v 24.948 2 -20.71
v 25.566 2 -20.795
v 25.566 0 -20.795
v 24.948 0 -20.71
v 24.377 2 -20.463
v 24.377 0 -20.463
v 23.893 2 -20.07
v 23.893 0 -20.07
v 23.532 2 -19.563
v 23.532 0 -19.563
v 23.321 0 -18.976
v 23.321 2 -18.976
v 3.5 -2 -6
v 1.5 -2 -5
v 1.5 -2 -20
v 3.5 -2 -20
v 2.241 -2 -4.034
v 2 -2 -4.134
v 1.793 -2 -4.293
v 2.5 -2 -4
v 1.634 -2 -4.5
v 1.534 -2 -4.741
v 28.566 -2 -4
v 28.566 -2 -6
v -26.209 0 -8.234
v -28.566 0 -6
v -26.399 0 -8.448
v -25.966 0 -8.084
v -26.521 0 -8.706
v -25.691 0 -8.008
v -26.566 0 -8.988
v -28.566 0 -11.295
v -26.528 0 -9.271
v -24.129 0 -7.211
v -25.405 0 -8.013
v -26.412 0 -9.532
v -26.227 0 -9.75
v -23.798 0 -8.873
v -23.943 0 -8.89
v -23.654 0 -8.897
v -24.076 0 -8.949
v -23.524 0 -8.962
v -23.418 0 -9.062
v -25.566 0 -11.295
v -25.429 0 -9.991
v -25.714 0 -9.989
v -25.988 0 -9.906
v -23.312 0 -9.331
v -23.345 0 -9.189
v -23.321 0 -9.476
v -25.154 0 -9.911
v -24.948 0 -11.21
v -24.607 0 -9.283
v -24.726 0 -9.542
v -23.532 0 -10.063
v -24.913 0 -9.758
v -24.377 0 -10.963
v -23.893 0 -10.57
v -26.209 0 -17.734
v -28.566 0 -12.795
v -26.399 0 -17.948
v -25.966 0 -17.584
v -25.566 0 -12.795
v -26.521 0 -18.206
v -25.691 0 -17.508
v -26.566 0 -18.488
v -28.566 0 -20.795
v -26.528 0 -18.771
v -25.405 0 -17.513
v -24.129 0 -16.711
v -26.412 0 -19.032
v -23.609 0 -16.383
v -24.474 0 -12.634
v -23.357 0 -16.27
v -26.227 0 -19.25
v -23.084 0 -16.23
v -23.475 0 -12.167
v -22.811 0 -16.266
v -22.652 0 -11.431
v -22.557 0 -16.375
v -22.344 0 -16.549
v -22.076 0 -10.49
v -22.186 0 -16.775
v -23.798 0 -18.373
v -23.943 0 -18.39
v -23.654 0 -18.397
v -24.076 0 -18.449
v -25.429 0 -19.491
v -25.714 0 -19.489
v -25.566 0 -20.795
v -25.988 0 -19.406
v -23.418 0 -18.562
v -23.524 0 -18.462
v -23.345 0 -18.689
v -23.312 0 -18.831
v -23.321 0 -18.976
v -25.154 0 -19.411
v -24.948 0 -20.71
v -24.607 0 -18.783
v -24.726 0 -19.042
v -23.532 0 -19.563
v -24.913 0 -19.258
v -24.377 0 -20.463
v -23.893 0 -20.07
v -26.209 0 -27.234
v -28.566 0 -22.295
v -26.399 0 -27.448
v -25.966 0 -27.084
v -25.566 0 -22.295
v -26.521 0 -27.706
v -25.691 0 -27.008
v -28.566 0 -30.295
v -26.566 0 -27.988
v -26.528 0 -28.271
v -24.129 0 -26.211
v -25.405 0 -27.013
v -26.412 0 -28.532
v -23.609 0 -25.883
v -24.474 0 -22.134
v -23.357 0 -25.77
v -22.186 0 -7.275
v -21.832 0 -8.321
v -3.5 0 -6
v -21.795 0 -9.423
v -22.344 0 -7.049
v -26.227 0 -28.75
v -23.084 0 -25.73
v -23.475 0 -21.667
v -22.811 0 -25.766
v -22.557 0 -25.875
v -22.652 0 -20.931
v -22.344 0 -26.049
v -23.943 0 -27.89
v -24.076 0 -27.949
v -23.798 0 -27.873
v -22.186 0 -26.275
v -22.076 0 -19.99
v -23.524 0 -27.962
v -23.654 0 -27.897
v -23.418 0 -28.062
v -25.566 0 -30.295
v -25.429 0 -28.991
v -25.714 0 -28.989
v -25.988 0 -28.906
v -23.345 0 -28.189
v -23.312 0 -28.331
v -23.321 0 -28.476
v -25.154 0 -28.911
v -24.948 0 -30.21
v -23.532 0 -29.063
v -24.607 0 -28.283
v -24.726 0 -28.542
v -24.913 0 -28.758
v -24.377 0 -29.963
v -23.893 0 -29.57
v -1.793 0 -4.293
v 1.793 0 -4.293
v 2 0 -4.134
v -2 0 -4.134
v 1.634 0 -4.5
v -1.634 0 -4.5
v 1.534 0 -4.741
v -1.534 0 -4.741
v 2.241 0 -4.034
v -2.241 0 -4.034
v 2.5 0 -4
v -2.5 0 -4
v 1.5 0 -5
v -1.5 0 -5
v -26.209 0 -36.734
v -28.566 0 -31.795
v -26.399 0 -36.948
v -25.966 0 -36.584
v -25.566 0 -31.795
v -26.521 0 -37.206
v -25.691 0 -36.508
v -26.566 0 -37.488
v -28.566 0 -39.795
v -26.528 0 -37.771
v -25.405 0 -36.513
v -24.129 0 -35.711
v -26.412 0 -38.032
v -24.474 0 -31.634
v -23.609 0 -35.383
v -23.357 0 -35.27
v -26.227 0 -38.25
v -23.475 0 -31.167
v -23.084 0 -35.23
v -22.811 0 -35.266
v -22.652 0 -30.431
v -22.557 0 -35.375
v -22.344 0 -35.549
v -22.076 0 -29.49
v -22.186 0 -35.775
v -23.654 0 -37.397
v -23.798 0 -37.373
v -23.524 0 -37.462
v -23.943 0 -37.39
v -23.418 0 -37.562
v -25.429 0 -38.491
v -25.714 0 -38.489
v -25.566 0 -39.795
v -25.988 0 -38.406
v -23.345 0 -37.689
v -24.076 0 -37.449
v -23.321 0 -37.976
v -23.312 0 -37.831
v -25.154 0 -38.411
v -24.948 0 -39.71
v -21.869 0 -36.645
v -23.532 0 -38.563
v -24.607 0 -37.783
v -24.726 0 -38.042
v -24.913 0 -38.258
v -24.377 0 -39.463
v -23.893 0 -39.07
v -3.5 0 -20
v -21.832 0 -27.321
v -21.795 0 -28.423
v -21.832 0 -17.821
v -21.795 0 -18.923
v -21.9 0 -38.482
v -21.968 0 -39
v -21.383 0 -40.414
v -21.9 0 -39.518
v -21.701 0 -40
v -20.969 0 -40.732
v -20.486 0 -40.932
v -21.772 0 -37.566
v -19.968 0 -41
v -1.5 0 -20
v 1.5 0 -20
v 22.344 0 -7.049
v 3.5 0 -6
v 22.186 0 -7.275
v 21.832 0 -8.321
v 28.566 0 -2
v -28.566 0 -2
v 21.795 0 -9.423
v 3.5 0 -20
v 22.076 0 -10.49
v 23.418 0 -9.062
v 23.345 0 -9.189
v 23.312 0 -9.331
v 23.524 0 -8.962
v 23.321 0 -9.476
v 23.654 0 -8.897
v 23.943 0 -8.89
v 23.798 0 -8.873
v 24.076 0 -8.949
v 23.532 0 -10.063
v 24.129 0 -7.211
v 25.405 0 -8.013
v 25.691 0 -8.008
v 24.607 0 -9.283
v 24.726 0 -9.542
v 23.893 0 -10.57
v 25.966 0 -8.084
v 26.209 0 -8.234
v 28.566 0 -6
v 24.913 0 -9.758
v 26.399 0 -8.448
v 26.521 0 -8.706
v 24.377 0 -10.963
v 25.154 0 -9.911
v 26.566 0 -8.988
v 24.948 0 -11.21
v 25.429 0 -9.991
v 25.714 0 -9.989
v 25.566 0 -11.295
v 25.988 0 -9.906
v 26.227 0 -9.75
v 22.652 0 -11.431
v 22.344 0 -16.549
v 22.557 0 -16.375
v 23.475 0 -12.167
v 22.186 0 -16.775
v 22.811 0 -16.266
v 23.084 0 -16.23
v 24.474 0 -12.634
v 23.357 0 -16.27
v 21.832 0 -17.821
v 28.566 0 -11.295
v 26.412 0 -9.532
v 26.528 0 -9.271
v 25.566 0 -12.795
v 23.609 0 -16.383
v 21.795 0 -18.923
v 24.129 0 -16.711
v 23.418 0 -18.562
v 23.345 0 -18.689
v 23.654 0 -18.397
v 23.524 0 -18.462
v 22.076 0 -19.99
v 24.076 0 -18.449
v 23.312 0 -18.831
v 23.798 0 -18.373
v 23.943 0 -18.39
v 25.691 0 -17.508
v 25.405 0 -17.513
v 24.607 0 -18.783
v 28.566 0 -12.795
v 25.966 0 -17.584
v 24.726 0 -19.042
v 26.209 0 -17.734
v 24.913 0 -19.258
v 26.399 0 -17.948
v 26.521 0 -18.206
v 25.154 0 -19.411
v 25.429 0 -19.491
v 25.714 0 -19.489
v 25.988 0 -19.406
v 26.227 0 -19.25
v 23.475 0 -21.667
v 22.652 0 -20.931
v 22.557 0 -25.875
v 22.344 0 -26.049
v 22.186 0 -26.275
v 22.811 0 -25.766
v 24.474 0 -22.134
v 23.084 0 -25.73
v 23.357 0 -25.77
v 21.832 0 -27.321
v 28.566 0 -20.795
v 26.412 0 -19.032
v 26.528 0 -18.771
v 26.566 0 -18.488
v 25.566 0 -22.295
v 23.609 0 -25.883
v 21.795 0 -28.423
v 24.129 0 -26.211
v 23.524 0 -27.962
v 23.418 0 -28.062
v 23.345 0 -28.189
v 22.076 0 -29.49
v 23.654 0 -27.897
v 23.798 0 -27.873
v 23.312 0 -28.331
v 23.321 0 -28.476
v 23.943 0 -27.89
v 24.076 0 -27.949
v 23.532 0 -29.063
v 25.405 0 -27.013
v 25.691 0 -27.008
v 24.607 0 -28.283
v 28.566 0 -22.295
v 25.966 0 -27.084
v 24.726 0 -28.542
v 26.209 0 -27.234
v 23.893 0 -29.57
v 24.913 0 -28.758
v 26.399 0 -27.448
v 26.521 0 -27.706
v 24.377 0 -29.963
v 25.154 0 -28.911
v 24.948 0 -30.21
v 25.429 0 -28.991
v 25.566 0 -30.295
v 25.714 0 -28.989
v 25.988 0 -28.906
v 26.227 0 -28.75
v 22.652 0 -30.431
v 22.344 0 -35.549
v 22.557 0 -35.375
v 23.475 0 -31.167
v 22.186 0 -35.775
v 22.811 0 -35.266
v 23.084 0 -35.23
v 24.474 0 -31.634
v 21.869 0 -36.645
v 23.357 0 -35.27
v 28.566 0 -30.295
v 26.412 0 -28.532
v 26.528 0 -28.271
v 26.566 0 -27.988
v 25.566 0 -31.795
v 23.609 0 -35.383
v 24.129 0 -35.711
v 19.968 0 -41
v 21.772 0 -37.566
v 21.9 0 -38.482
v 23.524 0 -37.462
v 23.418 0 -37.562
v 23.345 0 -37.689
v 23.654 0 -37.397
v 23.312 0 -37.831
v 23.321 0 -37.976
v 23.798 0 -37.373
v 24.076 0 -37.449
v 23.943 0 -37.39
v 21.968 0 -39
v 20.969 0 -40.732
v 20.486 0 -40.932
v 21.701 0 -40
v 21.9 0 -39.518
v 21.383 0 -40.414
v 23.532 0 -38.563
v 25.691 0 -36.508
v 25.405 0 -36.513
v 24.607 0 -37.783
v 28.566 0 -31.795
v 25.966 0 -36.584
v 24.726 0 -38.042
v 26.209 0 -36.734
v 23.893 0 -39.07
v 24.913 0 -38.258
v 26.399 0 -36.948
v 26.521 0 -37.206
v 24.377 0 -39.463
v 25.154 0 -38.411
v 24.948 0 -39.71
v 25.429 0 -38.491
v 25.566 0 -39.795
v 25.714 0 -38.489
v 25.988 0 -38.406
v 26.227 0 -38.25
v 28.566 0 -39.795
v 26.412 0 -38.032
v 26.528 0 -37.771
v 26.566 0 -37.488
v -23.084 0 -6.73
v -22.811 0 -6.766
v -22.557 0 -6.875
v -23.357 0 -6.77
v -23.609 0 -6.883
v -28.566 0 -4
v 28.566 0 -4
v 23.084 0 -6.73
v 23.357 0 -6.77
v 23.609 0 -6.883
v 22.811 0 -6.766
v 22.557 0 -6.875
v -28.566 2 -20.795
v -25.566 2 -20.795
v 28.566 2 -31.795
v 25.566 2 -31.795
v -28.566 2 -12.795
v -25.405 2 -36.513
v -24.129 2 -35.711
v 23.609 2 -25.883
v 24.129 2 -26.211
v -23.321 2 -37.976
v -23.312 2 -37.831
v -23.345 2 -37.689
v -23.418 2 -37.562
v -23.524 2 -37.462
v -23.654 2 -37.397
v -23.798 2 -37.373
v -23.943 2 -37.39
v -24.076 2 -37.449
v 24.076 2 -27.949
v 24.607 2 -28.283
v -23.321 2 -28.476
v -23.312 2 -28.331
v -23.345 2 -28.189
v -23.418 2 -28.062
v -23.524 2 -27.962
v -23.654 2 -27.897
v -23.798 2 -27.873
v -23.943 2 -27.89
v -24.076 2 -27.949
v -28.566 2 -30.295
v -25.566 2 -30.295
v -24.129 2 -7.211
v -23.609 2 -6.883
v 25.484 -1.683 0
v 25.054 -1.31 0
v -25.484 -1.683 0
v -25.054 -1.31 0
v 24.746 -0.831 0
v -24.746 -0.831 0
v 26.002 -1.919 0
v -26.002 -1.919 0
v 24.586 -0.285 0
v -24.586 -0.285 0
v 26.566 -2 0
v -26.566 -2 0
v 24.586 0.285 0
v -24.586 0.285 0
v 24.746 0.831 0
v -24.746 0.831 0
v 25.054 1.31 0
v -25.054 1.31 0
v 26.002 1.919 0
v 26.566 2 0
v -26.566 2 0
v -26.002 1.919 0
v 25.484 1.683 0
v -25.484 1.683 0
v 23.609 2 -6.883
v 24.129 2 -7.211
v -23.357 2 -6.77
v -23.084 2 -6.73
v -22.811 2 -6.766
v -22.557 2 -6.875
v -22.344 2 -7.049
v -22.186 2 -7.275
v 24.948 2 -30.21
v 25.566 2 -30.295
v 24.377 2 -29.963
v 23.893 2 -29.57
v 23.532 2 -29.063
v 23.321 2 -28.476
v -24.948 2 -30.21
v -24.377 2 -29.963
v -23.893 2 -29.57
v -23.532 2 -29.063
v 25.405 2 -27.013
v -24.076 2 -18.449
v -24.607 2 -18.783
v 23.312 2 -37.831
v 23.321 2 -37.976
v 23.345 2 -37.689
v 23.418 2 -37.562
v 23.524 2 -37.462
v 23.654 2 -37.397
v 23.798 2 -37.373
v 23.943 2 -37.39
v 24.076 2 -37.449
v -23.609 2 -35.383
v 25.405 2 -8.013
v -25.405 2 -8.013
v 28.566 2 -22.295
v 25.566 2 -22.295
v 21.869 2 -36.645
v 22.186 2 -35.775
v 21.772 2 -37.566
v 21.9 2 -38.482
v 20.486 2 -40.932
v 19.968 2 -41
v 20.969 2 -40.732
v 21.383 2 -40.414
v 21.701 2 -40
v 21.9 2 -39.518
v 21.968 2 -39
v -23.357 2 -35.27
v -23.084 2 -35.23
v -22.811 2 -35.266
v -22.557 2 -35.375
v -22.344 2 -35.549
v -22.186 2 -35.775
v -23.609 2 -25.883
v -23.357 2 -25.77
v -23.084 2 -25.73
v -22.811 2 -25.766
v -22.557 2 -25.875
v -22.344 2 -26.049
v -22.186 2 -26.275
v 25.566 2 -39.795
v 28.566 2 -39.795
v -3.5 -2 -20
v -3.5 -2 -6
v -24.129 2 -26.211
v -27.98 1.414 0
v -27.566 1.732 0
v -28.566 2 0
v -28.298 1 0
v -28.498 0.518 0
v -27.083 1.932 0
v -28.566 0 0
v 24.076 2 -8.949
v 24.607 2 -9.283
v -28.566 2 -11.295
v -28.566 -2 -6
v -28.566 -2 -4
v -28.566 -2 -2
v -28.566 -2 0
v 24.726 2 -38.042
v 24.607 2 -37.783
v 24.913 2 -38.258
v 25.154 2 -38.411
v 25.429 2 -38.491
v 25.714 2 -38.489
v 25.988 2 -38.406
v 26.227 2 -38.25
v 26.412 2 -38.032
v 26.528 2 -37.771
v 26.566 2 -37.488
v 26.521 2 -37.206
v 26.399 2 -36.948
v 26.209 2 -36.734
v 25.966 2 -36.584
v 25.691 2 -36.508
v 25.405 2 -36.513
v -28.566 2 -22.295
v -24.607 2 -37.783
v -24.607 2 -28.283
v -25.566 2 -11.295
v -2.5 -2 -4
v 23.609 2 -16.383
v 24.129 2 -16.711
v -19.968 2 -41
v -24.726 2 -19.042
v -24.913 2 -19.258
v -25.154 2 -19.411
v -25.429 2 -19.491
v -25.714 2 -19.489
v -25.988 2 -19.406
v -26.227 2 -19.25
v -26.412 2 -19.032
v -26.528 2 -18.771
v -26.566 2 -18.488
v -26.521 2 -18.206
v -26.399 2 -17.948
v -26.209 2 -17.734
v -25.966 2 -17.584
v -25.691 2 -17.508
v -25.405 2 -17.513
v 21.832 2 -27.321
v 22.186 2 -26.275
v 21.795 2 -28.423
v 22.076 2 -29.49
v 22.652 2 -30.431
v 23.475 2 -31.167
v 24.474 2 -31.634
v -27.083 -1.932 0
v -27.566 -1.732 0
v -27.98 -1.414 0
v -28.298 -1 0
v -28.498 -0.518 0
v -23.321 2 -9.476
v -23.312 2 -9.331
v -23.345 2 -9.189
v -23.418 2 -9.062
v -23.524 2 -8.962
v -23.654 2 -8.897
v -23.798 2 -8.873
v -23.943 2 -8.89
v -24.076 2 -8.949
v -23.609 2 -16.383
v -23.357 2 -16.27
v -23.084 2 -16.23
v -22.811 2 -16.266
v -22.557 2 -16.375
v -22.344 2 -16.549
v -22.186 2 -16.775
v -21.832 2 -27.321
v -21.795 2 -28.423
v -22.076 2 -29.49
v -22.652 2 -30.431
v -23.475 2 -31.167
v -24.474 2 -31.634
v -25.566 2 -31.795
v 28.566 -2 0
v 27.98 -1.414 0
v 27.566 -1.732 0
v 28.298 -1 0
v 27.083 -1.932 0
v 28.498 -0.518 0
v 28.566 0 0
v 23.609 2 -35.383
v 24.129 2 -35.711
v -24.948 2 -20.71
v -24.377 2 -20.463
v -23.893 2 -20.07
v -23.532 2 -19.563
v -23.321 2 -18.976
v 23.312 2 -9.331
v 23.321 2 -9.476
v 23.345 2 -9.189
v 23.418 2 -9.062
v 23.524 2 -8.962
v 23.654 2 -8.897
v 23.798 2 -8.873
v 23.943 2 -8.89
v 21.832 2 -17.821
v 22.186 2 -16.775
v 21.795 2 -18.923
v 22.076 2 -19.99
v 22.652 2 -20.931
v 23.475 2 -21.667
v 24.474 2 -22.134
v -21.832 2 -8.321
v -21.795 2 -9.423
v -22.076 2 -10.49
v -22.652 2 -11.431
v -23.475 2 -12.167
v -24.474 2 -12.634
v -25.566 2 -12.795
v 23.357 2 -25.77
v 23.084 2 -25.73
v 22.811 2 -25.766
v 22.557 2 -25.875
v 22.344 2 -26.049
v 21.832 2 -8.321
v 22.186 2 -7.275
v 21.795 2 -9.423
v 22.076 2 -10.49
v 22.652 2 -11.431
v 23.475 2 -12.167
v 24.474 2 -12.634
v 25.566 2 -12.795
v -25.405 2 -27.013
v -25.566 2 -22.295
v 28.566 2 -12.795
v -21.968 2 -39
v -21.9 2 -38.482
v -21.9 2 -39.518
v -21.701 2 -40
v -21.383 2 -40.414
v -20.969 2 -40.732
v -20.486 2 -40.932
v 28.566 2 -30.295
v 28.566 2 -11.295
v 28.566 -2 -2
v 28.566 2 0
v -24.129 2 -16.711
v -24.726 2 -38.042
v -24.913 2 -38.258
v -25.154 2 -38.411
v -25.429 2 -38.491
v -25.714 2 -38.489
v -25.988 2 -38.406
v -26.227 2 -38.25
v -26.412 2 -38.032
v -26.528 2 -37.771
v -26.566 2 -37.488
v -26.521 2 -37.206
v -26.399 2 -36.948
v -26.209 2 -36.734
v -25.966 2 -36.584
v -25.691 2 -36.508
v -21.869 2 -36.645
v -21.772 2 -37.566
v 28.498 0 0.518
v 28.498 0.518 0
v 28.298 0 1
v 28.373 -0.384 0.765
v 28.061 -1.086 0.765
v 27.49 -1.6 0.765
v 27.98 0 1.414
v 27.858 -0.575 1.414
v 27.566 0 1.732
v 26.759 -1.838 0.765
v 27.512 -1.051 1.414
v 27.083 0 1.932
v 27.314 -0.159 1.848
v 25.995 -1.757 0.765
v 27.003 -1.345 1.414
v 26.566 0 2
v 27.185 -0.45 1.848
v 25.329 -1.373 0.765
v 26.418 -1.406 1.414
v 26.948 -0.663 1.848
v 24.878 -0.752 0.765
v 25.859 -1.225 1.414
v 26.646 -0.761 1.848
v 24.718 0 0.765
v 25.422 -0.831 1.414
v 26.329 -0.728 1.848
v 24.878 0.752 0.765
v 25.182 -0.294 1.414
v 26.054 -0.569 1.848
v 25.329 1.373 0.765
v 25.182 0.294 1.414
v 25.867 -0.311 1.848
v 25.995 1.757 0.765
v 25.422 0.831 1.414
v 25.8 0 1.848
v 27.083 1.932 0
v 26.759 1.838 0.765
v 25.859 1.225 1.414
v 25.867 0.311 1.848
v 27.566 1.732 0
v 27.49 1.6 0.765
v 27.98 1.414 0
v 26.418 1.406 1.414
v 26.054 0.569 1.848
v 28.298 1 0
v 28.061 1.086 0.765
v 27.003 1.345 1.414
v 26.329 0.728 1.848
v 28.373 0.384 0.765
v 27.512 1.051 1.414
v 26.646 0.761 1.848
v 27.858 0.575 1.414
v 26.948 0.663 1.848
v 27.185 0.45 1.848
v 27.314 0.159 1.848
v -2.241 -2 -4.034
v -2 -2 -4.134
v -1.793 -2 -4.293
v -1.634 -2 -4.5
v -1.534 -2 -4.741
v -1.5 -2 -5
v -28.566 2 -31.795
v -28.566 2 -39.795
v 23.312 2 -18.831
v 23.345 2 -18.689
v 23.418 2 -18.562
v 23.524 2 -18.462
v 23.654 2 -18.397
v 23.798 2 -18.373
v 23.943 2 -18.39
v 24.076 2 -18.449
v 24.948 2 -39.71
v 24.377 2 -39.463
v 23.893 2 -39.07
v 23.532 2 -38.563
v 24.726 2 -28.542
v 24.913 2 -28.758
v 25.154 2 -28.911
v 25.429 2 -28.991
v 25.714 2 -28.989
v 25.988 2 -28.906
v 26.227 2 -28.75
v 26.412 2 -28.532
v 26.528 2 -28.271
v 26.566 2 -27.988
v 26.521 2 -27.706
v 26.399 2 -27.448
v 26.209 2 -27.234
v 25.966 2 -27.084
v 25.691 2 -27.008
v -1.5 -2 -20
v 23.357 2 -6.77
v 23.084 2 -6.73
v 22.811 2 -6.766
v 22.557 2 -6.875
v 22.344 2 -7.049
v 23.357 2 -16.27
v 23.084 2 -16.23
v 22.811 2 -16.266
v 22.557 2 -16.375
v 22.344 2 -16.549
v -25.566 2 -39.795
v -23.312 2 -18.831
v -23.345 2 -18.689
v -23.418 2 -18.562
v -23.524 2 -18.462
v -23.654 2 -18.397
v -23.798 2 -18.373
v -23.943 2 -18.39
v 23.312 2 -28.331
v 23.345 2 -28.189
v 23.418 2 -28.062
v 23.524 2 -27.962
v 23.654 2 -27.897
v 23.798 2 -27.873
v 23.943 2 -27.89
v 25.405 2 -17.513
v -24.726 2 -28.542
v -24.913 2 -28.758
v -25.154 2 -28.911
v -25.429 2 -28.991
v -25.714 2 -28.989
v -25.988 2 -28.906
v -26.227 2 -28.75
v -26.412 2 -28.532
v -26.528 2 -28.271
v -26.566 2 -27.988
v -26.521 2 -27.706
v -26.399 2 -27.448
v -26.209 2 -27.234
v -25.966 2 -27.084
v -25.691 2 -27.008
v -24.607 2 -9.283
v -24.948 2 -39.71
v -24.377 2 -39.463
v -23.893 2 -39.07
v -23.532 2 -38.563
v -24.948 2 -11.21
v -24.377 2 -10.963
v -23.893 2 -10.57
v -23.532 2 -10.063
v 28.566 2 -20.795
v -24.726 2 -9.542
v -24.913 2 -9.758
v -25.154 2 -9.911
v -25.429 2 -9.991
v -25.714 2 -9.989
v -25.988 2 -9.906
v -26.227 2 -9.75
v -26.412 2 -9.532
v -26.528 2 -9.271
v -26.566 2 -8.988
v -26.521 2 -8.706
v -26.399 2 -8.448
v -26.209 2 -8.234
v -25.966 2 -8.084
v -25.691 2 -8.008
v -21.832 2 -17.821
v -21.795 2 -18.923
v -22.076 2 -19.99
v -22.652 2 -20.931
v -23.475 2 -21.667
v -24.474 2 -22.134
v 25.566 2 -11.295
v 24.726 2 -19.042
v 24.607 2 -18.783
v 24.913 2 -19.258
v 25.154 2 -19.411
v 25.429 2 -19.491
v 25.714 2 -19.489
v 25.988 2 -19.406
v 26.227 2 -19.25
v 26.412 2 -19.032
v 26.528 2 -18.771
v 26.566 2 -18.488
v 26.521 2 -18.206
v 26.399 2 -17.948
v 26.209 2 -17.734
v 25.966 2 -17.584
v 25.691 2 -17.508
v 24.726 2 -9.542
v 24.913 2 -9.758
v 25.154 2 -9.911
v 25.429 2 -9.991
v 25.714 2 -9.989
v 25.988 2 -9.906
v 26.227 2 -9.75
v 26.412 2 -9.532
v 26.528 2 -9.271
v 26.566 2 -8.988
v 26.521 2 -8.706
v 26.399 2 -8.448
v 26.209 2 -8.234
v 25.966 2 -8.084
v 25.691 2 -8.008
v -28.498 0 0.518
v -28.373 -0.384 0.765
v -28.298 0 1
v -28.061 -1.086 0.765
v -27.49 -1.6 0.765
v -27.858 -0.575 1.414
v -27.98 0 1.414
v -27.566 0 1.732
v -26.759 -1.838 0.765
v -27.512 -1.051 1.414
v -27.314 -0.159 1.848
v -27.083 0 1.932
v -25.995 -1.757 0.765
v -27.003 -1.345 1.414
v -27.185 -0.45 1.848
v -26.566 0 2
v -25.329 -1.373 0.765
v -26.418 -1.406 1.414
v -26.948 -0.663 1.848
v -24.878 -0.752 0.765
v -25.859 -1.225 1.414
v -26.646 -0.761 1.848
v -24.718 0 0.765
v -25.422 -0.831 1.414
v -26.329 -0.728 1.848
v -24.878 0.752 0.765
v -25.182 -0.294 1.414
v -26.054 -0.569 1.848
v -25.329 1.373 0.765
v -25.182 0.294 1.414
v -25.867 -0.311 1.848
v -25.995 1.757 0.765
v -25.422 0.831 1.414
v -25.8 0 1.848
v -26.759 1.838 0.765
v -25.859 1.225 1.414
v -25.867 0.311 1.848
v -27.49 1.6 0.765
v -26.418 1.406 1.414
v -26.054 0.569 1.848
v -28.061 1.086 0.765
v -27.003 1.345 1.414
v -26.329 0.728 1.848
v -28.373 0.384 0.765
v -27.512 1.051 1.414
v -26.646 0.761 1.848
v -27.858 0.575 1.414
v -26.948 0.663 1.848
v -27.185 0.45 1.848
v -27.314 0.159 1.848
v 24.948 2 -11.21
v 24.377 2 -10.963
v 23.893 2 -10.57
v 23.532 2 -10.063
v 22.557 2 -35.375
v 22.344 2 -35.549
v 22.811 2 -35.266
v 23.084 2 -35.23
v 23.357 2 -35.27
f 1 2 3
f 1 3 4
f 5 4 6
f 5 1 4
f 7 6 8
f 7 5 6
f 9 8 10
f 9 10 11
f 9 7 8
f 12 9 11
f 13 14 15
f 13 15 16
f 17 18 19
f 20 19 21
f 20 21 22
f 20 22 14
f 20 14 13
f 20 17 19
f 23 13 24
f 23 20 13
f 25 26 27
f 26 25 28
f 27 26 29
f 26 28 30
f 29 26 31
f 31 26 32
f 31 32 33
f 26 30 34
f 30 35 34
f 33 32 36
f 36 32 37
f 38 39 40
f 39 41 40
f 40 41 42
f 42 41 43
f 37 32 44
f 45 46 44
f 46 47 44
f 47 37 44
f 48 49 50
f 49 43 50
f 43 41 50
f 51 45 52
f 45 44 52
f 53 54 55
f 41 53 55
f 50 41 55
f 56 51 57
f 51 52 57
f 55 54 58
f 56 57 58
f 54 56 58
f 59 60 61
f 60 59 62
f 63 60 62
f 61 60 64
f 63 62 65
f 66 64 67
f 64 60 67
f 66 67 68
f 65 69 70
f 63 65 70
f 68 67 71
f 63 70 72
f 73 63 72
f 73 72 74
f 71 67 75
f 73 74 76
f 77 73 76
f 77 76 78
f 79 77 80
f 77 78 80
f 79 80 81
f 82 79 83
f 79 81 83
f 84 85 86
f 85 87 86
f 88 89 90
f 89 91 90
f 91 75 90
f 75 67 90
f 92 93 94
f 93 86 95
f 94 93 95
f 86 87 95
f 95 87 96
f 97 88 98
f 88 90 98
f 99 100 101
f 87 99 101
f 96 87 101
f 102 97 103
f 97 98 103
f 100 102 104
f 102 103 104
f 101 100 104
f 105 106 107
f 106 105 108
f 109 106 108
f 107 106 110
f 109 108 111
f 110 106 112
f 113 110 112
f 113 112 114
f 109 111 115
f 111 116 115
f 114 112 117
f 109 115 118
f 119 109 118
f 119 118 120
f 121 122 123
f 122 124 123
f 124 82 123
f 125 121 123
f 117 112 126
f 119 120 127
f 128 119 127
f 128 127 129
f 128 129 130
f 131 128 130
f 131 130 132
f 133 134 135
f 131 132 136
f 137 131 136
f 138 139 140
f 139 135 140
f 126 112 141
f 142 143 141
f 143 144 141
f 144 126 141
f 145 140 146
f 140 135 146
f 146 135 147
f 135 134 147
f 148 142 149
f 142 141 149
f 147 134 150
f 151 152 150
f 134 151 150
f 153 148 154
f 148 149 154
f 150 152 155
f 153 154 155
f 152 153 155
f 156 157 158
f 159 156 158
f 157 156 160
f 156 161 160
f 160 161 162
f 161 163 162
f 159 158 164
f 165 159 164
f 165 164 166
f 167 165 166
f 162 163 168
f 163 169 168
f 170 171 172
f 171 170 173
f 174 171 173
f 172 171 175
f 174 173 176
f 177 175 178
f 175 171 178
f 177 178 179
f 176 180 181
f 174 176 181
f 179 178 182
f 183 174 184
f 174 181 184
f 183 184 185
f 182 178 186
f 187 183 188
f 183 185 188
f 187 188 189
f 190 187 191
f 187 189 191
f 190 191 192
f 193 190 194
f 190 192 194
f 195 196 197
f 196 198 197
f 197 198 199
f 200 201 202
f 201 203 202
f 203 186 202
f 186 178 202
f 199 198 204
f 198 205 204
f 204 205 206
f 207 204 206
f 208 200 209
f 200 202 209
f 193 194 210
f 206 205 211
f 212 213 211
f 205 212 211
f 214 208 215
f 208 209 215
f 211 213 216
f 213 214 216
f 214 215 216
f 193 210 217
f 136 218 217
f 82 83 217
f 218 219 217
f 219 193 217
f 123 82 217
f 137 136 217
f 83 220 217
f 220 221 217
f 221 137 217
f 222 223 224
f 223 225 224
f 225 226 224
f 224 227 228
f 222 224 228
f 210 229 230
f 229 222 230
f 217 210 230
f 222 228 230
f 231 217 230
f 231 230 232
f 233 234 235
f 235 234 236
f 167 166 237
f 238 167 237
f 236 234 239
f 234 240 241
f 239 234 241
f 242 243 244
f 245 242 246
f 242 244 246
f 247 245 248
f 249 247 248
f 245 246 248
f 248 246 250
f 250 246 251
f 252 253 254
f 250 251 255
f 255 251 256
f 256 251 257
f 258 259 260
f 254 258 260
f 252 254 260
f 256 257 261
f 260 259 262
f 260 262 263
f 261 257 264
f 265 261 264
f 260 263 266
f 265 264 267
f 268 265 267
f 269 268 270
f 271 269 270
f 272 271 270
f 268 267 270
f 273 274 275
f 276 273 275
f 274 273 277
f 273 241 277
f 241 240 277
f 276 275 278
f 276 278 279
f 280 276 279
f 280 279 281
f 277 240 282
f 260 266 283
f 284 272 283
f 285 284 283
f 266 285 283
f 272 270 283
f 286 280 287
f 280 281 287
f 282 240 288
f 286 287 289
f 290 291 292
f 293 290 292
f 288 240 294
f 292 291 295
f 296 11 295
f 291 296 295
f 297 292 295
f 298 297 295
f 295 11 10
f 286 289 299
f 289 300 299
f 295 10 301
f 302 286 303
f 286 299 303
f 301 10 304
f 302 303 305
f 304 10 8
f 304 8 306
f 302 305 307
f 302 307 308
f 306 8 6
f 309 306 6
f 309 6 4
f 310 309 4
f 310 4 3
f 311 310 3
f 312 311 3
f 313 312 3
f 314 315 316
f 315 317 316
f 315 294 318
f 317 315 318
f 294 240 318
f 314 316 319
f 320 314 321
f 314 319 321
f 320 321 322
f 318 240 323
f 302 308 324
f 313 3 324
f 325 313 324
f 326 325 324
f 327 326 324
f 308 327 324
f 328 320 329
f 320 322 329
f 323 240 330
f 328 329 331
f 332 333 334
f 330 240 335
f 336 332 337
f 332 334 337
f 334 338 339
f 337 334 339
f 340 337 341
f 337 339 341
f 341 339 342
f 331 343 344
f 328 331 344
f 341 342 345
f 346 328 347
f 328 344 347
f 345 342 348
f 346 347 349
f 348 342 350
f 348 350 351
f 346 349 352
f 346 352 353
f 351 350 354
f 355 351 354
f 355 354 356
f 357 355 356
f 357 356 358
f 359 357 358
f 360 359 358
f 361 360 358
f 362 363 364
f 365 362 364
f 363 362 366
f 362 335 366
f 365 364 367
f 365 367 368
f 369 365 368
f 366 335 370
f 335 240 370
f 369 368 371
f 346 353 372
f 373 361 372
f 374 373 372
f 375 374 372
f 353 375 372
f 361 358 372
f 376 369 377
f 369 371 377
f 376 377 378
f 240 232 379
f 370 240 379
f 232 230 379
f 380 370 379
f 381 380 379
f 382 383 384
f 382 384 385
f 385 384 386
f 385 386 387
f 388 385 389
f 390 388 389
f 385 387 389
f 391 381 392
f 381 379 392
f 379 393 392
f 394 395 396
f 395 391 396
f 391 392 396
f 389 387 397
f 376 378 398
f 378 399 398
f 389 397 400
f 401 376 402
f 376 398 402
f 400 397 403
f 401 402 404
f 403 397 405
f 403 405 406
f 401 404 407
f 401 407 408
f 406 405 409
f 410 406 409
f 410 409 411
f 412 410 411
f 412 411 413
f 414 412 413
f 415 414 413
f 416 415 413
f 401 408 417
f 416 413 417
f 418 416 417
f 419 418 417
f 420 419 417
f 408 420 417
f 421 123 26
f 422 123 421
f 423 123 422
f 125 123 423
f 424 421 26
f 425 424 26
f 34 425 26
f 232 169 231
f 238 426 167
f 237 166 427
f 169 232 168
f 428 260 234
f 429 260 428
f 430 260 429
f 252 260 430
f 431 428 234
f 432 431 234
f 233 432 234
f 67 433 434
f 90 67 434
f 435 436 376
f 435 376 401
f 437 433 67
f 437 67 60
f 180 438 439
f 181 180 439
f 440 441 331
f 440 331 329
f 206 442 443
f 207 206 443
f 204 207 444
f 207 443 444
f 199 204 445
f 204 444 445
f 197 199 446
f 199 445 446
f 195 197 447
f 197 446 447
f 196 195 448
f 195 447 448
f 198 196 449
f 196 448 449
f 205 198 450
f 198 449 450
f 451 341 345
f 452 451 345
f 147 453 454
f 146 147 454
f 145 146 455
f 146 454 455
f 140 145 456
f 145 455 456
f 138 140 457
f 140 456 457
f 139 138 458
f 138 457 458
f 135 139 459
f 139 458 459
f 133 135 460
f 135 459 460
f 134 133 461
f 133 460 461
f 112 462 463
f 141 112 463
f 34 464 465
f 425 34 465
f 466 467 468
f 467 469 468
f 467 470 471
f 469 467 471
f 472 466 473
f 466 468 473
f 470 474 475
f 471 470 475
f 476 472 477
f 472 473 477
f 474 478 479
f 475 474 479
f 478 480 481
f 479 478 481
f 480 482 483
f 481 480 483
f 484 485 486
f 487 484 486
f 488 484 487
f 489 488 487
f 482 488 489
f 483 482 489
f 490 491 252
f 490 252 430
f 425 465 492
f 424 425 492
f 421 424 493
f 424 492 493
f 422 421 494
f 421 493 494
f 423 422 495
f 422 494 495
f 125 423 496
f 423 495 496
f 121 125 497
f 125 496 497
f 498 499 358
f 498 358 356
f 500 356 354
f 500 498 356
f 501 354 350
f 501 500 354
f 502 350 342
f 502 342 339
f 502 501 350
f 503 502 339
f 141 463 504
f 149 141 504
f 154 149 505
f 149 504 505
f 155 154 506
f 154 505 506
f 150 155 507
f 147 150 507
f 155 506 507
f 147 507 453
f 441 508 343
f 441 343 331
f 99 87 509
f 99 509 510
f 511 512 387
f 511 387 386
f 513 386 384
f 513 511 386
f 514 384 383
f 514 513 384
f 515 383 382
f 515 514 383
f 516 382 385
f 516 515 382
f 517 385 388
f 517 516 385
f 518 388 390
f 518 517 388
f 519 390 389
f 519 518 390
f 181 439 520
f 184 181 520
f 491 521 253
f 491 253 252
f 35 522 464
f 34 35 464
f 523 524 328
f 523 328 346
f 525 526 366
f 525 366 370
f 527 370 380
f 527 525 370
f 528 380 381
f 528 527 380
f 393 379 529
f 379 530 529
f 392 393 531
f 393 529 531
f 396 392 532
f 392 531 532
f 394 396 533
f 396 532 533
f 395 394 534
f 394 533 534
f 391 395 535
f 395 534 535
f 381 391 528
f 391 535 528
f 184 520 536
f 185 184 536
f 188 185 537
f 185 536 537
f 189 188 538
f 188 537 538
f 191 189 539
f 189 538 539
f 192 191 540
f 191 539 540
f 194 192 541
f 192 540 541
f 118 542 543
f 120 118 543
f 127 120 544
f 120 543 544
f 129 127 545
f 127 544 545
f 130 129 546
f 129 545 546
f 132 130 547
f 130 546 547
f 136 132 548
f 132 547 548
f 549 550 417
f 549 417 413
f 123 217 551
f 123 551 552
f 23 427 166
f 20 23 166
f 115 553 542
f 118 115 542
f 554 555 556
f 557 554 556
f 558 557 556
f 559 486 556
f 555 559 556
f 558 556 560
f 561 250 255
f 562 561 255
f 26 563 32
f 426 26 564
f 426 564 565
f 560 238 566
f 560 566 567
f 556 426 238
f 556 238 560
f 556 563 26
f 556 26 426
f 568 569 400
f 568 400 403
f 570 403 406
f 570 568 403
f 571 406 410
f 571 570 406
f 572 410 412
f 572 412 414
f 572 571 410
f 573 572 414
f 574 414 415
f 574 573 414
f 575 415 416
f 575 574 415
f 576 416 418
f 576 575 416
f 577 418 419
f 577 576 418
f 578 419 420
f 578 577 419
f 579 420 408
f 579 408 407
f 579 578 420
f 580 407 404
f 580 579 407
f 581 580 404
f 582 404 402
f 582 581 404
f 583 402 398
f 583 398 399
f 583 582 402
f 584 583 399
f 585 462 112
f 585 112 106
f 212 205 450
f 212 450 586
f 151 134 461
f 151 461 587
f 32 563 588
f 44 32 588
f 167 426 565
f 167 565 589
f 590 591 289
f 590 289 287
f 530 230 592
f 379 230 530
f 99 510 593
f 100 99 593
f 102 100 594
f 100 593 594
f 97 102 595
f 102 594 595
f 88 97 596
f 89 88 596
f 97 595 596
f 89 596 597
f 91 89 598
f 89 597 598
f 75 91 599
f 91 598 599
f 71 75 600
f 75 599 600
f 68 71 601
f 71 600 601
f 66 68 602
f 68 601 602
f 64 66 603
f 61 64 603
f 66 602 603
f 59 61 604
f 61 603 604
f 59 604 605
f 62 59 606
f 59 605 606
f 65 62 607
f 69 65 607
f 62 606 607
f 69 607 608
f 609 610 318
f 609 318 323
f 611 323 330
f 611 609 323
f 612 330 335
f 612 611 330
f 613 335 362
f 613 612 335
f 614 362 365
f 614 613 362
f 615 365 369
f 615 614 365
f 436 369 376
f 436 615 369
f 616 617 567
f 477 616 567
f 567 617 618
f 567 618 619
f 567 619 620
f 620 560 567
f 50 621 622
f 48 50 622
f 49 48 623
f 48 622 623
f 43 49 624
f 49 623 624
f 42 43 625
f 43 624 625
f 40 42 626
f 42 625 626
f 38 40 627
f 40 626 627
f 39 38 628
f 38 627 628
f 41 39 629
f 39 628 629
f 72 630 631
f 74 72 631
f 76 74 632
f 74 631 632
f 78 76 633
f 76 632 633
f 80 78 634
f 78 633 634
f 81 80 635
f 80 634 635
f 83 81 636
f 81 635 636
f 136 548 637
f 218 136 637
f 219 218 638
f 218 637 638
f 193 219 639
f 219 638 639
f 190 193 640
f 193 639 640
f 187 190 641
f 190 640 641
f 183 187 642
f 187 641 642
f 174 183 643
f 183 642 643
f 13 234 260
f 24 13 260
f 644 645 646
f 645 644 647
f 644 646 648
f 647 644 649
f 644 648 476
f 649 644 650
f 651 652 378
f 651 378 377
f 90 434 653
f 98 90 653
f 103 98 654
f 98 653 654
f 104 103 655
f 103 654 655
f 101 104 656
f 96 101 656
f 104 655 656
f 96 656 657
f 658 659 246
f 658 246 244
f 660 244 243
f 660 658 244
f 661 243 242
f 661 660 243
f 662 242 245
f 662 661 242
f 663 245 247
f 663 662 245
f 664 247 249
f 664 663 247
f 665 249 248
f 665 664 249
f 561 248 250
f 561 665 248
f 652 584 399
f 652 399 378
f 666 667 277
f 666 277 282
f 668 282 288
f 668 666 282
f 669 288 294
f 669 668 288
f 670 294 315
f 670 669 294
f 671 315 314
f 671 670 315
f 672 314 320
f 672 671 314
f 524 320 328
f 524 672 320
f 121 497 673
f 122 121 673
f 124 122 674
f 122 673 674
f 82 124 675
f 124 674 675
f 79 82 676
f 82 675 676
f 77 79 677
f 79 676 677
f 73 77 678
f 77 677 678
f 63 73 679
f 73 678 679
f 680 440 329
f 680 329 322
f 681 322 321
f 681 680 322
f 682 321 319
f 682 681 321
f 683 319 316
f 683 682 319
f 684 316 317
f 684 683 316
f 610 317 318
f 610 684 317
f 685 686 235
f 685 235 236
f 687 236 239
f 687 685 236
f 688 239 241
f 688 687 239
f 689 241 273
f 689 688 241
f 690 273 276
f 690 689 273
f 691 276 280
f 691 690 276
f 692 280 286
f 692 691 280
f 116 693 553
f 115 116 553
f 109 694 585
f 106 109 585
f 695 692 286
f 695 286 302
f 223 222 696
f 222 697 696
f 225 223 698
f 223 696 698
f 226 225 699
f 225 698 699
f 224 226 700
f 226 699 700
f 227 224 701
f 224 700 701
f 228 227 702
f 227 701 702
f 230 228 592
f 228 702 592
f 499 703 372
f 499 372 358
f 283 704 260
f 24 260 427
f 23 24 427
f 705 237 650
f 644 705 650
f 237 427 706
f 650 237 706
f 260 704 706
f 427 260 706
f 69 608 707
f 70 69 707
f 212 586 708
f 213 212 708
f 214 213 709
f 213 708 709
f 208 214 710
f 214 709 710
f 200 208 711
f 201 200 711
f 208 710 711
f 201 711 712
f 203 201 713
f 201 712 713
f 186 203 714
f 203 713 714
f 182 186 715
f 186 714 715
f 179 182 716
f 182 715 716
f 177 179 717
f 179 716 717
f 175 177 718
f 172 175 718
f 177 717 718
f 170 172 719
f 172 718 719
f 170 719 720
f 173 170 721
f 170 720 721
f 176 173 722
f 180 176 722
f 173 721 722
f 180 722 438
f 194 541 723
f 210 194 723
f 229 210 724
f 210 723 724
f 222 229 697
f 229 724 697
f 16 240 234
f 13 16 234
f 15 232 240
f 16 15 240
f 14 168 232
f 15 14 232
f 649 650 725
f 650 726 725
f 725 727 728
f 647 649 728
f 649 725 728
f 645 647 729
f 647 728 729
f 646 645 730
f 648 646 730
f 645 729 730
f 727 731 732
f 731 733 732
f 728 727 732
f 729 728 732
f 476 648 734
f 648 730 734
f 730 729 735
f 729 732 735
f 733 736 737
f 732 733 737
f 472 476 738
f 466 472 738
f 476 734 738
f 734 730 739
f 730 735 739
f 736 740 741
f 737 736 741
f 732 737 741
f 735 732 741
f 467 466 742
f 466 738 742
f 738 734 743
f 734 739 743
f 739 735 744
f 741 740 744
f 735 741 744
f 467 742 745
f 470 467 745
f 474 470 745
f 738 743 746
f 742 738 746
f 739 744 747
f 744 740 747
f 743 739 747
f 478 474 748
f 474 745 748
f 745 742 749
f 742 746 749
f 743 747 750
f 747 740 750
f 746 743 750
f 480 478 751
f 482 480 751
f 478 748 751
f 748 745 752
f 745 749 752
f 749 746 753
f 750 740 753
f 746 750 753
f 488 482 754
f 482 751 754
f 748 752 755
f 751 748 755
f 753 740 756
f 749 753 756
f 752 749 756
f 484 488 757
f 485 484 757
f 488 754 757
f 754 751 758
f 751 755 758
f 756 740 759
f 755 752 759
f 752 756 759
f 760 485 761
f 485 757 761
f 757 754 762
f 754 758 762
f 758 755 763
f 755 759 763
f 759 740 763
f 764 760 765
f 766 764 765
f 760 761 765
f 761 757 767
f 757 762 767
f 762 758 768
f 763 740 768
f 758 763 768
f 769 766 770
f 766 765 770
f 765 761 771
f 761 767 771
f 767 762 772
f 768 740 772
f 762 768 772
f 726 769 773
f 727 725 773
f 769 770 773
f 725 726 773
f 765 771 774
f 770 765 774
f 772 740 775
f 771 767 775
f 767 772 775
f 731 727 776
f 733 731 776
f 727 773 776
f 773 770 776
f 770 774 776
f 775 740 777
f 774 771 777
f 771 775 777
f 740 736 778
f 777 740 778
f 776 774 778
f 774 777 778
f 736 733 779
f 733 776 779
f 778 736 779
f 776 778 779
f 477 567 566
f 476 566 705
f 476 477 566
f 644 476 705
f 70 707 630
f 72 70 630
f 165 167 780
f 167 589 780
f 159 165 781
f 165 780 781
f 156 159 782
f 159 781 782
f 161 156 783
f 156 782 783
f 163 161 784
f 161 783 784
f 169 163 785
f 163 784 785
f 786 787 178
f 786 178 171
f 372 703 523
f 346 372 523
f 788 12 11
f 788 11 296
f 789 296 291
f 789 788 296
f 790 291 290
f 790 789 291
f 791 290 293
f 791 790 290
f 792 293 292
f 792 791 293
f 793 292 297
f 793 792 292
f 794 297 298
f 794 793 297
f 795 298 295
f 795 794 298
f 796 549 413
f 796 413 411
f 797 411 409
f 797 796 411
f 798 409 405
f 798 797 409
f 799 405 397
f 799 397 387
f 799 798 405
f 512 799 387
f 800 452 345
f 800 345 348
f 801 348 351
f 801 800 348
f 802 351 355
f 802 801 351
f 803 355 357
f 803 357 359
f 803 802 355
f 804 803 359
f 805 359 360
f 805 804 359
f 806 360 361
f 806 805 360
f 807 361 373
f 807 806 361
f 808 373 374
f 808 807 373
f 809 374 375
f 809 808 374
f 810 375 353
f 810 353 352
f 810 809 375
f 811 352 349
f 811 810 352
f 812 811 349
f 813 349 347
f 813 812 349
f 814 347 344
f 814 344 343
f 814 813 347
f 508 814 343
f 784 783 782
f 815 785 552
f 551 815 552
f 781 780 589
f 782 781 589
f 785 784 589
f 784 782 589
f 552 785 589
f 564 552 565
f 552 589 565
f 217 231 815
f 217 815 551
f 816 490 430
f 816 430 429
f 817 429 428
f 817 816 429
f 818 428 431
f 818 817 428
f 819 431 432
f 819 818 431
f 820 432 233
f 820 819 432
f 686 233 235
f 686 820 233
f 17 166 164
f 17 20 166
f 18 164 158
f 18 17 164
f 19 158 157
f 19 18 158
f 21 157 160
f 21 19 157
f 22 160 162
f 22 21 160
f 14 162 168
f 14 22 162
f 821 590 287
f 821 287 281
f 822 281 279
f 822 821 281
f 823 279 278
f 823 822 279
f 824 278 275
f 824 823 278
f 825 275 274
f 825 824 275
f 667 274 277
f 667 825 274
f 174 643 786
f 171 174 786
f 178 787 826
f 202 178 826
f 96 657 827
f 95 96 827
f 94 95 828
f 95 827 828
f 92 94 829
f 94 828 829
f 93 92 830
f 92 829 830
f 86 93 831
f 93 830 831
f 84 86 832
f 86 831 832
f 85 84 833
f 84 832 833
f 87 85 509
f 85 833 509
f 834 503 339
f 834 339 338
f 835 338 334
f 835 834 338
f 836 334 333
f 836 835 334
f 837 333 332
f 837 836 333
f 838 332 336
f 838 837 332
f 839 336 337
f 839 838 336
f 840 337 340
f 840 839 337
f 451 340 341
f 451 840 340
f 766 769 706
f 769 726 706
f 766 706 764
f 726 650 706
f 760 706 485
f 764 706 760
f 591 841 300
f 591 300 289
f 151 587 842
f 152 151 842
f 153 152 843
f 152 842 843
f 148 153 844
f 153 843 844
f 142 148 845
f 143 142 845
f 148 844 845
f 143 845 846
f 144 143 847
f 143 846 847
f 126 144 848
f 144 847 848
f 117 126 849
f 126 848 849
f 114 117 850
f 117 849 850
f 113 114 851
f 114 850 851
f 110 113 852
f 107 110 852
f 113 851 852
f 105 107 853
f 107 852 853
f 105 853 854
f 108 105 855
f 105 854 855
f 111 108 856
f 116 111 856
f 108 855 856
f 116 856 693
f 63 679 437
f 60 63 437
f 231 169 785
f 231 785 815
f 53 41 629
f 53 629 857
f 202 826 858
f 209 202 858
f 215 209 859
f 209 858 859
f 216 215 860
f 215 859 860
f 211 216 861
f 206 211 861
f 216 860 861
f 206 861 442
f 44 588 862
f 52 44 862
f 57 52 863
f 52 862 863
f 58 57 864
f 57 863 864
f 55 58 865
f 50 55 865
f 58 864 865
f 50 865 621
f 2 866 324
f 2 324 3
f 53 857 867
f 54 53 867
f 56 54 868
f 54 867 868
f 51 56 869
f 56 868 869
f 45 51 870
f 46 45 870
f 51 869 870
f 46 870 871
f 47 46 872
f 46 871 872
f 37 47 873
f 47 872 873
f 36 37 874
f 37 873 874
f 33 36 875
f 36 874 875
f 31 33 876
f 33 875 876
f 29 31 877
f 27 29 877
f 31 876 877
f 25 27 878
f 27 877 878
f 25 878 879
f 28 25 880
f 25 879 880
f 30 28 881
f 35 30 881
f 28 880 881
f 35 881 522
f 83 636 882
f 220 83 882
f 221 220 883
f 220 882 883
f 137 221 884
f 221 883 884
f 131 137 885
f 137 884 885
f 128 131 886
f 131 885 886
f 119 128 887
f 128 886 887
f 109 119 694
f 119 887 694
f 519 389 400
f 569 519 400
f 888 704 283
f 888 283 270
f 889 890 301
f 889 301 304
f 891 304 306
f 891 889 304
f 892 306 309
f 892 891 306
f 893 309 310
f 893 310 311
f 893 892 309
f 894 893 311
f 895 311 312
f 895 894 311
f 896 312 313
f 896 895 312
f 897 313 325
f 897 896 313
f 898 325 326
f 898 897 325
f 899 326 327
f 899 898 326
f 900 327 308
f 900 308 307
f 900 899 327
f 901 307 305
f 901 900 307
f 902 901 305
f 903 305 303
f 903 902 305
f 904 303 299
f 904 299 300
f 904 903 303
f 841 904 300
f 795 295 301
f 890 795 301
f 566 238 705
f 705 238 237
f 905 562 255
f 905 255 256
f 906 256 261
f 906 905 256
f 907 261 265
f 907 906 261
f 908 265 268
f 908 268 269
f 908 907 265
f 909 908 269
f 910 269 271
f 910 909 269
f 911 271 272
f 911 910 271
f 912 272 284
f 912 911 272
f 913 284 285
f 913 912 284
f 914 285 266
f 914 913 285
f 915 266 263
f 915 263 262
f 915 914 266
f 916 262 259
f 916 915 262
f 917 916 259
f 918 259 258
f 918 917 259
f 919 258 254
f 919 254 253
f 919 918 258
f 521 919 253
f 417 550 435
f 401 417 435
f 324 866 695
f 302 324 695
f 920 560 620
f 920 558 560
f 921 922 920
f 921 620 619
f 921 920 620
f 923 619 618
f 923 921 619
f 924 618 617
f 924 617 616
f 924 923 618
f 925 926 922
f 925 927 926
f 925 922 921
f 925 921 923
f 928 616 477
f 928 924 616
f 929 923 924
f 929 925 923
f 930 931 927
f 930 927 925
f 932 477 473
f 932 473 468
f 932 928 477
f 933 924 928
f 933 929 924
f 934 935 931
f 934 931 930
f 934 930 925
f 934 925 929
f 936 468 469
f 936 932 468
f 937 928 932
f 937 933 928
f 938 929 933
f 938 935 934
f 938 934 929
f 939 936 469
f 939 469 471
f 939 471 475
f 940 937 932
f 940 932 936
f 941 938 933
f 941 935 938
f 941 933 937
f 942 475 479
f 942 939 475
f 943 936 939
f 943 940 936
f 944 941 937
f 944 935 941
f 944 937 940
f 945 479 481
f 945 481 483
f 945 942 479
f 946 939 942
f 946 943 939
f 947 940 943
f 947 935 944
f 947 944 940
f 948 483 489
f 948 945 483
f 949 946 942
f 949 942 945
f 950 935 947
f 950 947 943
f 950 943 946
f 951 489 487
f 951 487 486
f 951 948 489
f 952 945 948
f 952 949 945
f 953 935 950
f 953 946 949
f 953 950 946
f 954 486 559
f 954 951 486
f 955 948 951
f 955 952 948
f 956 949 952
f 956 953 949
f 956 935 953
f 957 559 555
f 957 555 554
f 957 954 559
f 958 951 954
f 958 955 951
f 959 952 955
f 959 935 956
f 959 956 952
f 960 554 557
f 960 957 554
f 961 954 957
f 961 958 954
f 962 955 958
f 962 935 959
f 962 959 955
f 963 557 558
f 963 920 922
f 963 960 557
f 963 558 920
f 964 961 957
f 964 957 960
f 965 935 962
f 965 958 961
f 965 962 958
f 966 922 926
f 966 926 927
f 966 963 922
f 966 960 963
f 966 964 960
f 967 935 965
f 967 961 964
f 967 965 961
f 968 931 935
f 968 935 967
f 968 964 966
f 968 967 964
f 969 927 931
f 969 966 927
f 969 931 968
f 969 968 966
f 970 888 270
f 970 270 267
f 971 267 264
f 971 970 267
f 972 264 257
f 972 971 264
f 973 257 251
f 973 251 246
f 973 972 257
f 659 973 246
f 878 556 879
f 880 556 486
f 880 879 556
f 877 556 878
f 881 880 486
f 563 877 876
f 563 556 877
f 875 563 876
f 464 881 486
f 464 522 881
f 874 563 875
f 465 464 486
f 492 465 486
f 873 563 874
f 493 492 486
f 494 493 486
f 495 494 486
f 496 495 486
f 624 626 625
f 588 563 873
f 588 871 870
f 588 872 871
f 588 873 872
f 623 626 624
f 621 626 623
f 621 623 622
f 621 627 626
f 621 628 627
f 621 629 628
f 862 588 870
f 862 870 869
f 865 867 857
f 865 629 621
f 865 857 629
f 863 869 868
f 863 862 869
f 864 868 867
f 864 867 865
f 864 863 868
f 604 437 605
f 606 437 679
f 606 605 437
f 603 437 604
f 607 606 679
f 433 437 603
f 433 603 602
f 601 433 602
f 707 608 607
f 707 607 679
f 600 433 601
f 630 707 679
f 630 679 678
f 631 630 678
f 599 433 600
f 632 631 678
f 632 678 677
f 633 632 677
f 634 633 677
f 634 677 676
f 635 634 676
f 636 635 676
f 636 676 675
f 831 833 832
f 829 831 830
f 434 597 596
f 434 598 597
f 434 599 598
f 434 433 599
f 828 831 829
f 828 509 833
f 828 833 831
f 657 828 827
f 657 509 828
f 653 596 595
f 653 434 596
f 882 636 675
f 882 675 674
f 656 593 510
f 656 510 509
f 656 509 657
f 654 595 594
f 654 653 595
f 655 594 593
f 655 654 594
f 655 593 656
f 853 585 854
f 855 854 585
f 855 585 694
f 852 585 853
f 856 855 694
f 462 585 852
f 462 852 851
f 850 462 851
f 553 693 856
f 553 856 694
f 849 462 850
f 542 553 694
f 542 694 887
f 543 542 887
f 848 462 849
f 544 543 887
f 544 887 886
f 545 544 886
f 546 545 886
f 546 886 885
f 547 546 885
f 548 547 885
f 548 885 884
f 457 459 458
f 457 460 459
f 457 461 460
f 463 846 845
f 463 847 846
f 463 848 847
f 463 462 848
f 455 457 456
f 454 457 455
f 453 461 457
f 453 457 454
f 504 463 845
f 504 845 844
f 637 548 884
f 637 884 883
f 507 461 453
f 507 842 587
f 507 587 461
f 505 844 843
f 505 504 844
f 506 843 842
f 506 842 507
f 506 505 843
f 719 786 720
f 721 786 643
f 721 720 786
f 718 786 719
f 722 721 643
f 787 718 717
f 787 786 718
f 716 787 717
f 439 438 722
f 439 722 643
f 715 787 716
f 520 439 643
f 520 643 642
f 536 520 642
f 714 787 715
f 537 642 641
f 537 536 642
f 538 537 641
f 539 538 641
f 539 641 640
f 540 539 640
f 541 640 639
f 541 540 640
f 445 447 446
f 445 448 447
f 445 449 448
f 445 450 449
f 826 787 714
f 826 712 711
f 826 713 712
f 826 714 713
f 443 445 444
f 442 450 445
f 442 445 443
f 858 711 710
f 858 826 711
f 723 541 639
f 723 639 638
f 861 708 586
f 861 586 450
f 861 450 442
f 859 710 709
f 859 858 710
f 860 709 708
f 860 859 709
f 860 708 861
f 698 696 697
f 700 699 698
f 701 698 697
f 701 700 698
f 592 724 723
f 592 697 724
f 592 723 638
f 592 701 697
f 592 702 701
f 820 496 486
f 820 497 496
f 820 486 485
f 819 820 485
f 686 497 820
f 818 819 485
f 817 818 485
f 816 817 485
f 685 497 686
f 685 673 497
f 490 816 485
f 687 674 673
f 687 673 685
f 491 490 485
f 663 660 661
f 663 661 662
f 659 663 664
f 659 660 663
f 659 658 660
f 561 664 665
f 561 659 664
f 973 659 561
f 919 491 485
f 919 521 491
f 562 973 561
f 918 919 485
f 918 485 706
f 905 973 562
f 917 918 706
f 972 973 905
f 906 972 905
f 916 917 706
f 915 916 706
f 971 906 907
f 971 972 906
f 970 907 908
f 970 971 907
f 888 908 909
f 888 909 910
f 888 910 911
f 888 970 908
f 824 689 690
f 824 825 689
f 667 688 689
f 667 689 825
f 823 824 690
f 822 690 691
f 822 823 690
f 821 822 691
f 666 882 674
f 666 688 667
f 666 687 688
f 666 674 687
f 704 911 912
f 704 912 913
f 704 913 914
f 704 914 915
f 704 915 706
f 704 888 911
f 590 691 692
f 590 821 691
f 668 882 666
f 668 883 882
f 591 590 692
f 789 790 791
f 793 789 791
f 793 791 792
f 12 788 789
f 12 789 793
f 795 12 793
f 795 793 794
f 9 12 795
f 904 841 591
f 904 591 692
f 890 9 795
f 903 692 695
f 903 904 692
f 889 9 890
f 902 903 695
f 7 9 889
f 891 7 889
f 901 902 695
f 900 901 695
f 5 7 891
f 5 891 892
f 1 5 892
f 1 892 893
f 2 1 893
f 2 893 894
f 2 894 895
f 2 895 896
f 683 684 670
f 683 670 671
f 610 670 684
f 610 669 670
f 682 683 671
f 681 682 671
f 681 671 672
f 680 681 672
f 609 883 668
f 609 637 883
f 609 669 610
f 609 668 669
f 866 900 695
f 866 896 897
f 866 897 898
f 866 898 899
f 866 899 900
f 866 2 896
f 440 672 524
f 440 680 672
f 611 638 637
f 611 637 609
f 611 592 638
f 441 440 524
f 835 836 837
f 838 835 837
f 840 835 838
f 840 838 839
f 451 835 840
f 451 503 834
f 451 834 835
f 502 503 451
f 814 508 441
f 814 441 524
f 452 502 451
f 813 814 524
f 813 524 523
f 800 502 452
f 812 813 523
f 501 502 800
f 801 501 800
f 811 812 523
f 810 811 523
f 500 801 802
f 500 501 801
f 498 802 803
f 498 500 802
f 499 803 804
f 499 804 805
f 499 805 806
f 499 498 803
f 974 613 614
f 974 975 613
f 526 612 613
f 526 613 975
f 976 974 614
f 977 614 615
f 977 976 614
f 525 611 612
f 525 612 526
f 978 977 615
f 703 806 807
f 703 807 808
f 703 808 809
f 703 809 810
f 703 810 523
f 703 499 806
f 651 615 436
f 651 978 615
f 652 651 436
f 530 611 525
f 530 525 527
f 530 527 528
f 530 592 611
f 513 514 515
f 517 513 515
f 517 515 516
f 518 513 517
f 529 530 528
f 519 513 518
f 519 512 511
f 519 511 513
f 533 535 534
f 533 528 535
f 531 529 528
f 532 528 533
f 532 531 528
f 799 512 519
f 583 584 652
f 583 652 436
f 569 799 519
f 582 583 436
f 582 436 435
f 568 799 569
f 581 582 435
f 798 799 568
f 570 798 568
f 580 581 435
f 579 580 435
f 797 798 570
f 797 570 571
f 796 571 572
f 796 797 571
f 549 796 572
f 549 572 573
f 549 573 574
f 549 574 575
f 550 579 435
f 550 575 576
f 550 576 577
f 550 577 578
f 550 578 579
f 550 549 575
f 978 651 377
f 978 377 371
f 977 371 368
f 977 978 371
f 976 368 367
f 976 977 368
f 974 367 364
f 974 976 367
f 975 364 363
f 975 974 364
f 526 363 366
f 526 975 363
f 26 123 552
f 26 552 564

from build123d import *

# Parameters (mm, degrees)
SKETCH1_W            = 57.131427428
SKETCH1_H            = 41
BOSS_EXTRUDE1_DEPTH  = 2
SKETCH2_W            = 28.565713714
SKETCH2_H            = 2
BOSS_EXTRUDE2_DEPTH  = 2
CUT_EXTRUDE4_DEPTH   = 2
LPATTERN1_COUNT      = 4
LPATTERN1_PITCH      = 9.5
MIRROR2_COPY_1_DEPTH = 2
MIRROR2_COPY_2_DEPTH = 2
MIRROR2_COPY_3_DEPTH = 2
FILLET1_R            = 1
FILLET2_R            = 2


with BuildPart() as part:
    # Sketch1 → Boss-Extrude1 (new body)
    with BuildSketch(Plane(origin=(0, 0, 0), x_dir=(1, 0, 0), z_dir=(0, 1, 0))):
        with Locations((0, 20.5)):
            Rectangle(SKETCH1_W, SKETCH1_H)
    extrude(amount=BOSS_EXTRUDE1_DEPTH)

    # Sketch2 → Boss-Extrude2 (add)
    with BuildSketch(Plane.XZ):
        with Locations((-14.282856857, -1)):
            Rectangle(SKETCH2_W, SKETCH2_H)
        with Locations((14.282856857, -1)):
            Rectangle(SKETCH2_W, SKETCH2_H)
        Polygon((1.5, -20), (3.5, -20), (3.5, -6), (28.565713714, -6), (28.565713714, -4), (1.5, -4), align=None)
        Polygon((-28.565713714, -6), (-28.565713714, -4), (-1.5, -4), (-1.5, -20), (-3.5, -20), (-3.5, -6), align=None)
    extrude(amount=BOSS_EXTRUDE2_DEPTH)

    # Sketch4 → Revolve1 (revolve)
    with BuildSketch(Plane.XZ):
        with BuildLine():
            Line((-26.565713714, 0), (-28.565713714, 0))
            ThreePointArc((-28.565713714, 0), (-27.979927277, 1.414213562), (-26.565713714, 2))
            Line((-26.565713714, 2), (-26.565713714, 0))
        make_face()
    revolve1 = revolve(axis=Axis((-26.565713714, 0, 0), (0, 0, 1)))

    # Mirror1: Revolve1 across plane
    add(revolve1.mirror(Plane(origin=(0, 0, 0), x_dir=(0, 0, 1), z_dir=(1, 0, 0))))

    # Sketch7 → Cut-Extrude4 (cut)
    with BuildSketch(Plane(origin=(0, 2, 0), x_dir=(1, 0, 0), z_dir=(0, 1, 0))):
        with BuildLine():
            Line((-24.076247257, 8.949248512), (-24.606518128, 9.282743394))
            ThreePointArc((-24.606518128, 9.282743394), (-26.412219505, 9.532379514), (-25.405087398, 8.012984708))
            Line((-25.405087398, 8.012984708), (-24.129168598, 7.210541254))
            Line((-24.129168598, 7.210541254), (-23.60872049, 6.883224049))
            ThreePointArc((-23.60872049, 6.883224049), (-22.810789527, 6.765633149), (-22.185605476, 7.275207818))
            ThreePointArc((-22.185605476, 7.275207818), (-22.329575973, 10.981780083), (-25.565713714, 12.794738433))
            Line((-25.565713714, 12.794738433), (-28.565713714, 12.794738433))
            Line((-28.565713714, 12.794738433), (-28.565713714, 11.294738433))
            Line((-28.565713714, 11.294738433), (-25.565713714, 11.294738433))
            ThreePointArc((-25.565713714, 11.294738433), (-24.121260099, 10.783081105), (-23.320945498, 9.476277368))
            ThreePointArc((-23.320945498, 9.476277368), (-23.52393963, 8.962456819), (-24.076247257, 8.949248512))
        make_face()
    cut_extrude4 = extrude(amount=-CUT_EXTRUDE4_DEPTH, mode=Mode.SUBTRACT)

    # LPattern1: Cut-Extrude4 ×4
    with Locations(*[(0, 0, -i * LPATTERN1_PITCH) for i in range(1, LPATTERN1_COUNT)]):
        add(cut_extrude4, mode=Mode.SUBTRACT)

    # Mirror2: Cut-Extrude4 across plane
    add(cut_extrude4.mirror(Plane(origin=(0, 0, 0), x_dir=(0, 0, 1), z_dir=(1, 0, 0))), mode=Mode.SUBTRACT)

    # Mirror2 copy 1 sketch → Mirror2 copy 1 (cut)
    with BuildSketch(Plane(origin=(0, 2, -9.5), x_dir=(-1, 0, 0), z_dir=(0, 1, 0))):
        with BuildLine():
            Line((-24.076247257, -8.949248512), (-24.606518128, -9.282743394))
            ThreePointArc((-24.606518128, -9.282743394), (-26.412219505, -9.532379514), (-25.405087398, -8.012984708))
            Line((-25.405087398, -8.012984708), (-24.129168598, -7.210541254))
            Line((-24.129168598, -7.210541254), (-23.60872049, -6.883224049))
            ThreePointArc((-23.60872049, -6.883224049), (-22.810789527, -6.765633149), (-22.185605476, -7.275207818))
            ThreePointArc((-22.185605476, -7.275207818), (-22.329575973, -10.981780083), (-25.565713714, -12.794738433))
            Line((-25.565713714, -12.794738433), (-28.565713714, -12.794738433))
            Line((-28.565713714, -12.794738433), (-28.565713714, -11.294738433))
            Line((-28.565713714, -11.294738433), (-25.565713714, -11.294738433))
            ThreePointArc((-25.565713714, -11.294738433), (-24.121260099, -10.783081105), (-23.320945498, -9.476277368))
            ThreePointArc((-23.320945498, -9.476277368), (-23.52393963, -8.962456819), (-24.076247257, -8.949248512))
        make_face()
    extrude(amount=-MIRROR2_COPY_1_DEPTH, mode=Mode.SUBTRACT)

    # Mirror2 copy 2 sketch → Mirror2 copy 2 (cut)
    with BuildSketch(Plane(origin=(0, 2, -19), x_dir=(-1, 0, 0), z_dir=(0, 1, 0))):
        with BuildLine():
            Line((-24.076247257, -8.949248512), (-24.606518128, -9.282743394))
            ThreePointArc((-24.606518128, -9.282743394), (-26.412219505, -9.532379514), (-25.405087398, -8.012984708))
            Line((-25.405087398, -8.012984708), (-24.129168598, -7.210541254))
            Line((-24.129168598, -7.210541254), (-23.60872049, -6.883224049))
            ThreePointArc((-23.60872049, -6.883224049), (-22.810789527, -6.765633149), (-22.185605476, -7.275207818))
            ThreePointArc((-22.185605476, -7.275207818), (-22.329575973, -10.981780083), (-25.565713714, -12.794738433))
            Line((-25.565713714, -12.794738433), (-28.565713714, -12.794738433))
            Line((-28.565713714, -12.794738433), (-28.565713714, -11.294738433))
            Line((-28.565713714, -11.294738433), (-25.565713714, -11.294738433))
            ThreePointArc((-25.565713714, -11.294738433), (-24.121260099, -10.783081105), (-23.320945498, -9.476277368))
            ThreePointArc((-23.320945498, -9.476277368), (-23.52393963, -8.962456819), (-24.076247257, -8.949248512))
        make_face()
    extrude(amount=-MIRROR2_COPY_2_DEPTH, mode=Mode.SUBTRACT)

    # Mirror2 copy 3 sketch → Mirror2 copy 3 (cut)
    with BuildSketch(Plane(origin=(0, 2, -28.5), x_dir=(-1, 0, 0), z_dir=(0, 1, 0))):
        with BuildLine():
            Line((-24.076247257, -8.949248512), (-24.606518128, -9.282743394))
            ThreePointArc((-24.606518128, -9.282743394), (-26.412219505, -9.532379514), (-25.405087398, -8.012984708))
            Line((-25.405087398, -8.012984708), (-24.129168598, -7.210541254))
            Line((-24.129168598, -7.210541254), (-23.60872049, -6.883224049))
            ThreePointArc((-23.60872049, -6.883224049), (-22.810789527, -6.765633149), (-22.185605476, -7.275207818))
            ThreePointArc((-22.185605476, -7.275207818), (-22.329575973, -10.981780083), (-25.565713714, -12.794738433))
            Line((-25.565713714, -12.794738433), (-28.565713714, -12.794738433))
            Line((-28.565713714, -12.794738433), (-28.565713714, -11.294738433))
            Line((-28.565713714, -11.294738433), (-25.565713714, -11.294738433))
            ThreePointArc((-25.565713714, -11.294738433), (-24.121260099, -10.783081105), (-23.320945498, -9.476277368))
            ThreePointArc((-23.320945498, -9.476277368), (-23.52393963, -8.962456819), (-24.076247257, -8.949248512))
        make_face()
    extrude(amount=-MIRROR2_COPY_3_DEPTH, mode=Mode.SUBTRACT)

    # Fillet1
    fillet1_edges = [part.edges().sort_by_distance(p)[0] for p in [
        (1.5, -1, -4),
        (-1.5, -1, -4),
    ]]
    fillet(fillet1_edges, radius=FILLET1_R)

    # Fillet2
    fillet2_edges = [part.edges().sort_by_distance(p)[0] for p in [
        (-24.099412322, 1, -41),
        (24.099412322, 1, -41),
    ]]
    fillet(fillet2_edges, radius=FILLET2_R)


solid = part.part
